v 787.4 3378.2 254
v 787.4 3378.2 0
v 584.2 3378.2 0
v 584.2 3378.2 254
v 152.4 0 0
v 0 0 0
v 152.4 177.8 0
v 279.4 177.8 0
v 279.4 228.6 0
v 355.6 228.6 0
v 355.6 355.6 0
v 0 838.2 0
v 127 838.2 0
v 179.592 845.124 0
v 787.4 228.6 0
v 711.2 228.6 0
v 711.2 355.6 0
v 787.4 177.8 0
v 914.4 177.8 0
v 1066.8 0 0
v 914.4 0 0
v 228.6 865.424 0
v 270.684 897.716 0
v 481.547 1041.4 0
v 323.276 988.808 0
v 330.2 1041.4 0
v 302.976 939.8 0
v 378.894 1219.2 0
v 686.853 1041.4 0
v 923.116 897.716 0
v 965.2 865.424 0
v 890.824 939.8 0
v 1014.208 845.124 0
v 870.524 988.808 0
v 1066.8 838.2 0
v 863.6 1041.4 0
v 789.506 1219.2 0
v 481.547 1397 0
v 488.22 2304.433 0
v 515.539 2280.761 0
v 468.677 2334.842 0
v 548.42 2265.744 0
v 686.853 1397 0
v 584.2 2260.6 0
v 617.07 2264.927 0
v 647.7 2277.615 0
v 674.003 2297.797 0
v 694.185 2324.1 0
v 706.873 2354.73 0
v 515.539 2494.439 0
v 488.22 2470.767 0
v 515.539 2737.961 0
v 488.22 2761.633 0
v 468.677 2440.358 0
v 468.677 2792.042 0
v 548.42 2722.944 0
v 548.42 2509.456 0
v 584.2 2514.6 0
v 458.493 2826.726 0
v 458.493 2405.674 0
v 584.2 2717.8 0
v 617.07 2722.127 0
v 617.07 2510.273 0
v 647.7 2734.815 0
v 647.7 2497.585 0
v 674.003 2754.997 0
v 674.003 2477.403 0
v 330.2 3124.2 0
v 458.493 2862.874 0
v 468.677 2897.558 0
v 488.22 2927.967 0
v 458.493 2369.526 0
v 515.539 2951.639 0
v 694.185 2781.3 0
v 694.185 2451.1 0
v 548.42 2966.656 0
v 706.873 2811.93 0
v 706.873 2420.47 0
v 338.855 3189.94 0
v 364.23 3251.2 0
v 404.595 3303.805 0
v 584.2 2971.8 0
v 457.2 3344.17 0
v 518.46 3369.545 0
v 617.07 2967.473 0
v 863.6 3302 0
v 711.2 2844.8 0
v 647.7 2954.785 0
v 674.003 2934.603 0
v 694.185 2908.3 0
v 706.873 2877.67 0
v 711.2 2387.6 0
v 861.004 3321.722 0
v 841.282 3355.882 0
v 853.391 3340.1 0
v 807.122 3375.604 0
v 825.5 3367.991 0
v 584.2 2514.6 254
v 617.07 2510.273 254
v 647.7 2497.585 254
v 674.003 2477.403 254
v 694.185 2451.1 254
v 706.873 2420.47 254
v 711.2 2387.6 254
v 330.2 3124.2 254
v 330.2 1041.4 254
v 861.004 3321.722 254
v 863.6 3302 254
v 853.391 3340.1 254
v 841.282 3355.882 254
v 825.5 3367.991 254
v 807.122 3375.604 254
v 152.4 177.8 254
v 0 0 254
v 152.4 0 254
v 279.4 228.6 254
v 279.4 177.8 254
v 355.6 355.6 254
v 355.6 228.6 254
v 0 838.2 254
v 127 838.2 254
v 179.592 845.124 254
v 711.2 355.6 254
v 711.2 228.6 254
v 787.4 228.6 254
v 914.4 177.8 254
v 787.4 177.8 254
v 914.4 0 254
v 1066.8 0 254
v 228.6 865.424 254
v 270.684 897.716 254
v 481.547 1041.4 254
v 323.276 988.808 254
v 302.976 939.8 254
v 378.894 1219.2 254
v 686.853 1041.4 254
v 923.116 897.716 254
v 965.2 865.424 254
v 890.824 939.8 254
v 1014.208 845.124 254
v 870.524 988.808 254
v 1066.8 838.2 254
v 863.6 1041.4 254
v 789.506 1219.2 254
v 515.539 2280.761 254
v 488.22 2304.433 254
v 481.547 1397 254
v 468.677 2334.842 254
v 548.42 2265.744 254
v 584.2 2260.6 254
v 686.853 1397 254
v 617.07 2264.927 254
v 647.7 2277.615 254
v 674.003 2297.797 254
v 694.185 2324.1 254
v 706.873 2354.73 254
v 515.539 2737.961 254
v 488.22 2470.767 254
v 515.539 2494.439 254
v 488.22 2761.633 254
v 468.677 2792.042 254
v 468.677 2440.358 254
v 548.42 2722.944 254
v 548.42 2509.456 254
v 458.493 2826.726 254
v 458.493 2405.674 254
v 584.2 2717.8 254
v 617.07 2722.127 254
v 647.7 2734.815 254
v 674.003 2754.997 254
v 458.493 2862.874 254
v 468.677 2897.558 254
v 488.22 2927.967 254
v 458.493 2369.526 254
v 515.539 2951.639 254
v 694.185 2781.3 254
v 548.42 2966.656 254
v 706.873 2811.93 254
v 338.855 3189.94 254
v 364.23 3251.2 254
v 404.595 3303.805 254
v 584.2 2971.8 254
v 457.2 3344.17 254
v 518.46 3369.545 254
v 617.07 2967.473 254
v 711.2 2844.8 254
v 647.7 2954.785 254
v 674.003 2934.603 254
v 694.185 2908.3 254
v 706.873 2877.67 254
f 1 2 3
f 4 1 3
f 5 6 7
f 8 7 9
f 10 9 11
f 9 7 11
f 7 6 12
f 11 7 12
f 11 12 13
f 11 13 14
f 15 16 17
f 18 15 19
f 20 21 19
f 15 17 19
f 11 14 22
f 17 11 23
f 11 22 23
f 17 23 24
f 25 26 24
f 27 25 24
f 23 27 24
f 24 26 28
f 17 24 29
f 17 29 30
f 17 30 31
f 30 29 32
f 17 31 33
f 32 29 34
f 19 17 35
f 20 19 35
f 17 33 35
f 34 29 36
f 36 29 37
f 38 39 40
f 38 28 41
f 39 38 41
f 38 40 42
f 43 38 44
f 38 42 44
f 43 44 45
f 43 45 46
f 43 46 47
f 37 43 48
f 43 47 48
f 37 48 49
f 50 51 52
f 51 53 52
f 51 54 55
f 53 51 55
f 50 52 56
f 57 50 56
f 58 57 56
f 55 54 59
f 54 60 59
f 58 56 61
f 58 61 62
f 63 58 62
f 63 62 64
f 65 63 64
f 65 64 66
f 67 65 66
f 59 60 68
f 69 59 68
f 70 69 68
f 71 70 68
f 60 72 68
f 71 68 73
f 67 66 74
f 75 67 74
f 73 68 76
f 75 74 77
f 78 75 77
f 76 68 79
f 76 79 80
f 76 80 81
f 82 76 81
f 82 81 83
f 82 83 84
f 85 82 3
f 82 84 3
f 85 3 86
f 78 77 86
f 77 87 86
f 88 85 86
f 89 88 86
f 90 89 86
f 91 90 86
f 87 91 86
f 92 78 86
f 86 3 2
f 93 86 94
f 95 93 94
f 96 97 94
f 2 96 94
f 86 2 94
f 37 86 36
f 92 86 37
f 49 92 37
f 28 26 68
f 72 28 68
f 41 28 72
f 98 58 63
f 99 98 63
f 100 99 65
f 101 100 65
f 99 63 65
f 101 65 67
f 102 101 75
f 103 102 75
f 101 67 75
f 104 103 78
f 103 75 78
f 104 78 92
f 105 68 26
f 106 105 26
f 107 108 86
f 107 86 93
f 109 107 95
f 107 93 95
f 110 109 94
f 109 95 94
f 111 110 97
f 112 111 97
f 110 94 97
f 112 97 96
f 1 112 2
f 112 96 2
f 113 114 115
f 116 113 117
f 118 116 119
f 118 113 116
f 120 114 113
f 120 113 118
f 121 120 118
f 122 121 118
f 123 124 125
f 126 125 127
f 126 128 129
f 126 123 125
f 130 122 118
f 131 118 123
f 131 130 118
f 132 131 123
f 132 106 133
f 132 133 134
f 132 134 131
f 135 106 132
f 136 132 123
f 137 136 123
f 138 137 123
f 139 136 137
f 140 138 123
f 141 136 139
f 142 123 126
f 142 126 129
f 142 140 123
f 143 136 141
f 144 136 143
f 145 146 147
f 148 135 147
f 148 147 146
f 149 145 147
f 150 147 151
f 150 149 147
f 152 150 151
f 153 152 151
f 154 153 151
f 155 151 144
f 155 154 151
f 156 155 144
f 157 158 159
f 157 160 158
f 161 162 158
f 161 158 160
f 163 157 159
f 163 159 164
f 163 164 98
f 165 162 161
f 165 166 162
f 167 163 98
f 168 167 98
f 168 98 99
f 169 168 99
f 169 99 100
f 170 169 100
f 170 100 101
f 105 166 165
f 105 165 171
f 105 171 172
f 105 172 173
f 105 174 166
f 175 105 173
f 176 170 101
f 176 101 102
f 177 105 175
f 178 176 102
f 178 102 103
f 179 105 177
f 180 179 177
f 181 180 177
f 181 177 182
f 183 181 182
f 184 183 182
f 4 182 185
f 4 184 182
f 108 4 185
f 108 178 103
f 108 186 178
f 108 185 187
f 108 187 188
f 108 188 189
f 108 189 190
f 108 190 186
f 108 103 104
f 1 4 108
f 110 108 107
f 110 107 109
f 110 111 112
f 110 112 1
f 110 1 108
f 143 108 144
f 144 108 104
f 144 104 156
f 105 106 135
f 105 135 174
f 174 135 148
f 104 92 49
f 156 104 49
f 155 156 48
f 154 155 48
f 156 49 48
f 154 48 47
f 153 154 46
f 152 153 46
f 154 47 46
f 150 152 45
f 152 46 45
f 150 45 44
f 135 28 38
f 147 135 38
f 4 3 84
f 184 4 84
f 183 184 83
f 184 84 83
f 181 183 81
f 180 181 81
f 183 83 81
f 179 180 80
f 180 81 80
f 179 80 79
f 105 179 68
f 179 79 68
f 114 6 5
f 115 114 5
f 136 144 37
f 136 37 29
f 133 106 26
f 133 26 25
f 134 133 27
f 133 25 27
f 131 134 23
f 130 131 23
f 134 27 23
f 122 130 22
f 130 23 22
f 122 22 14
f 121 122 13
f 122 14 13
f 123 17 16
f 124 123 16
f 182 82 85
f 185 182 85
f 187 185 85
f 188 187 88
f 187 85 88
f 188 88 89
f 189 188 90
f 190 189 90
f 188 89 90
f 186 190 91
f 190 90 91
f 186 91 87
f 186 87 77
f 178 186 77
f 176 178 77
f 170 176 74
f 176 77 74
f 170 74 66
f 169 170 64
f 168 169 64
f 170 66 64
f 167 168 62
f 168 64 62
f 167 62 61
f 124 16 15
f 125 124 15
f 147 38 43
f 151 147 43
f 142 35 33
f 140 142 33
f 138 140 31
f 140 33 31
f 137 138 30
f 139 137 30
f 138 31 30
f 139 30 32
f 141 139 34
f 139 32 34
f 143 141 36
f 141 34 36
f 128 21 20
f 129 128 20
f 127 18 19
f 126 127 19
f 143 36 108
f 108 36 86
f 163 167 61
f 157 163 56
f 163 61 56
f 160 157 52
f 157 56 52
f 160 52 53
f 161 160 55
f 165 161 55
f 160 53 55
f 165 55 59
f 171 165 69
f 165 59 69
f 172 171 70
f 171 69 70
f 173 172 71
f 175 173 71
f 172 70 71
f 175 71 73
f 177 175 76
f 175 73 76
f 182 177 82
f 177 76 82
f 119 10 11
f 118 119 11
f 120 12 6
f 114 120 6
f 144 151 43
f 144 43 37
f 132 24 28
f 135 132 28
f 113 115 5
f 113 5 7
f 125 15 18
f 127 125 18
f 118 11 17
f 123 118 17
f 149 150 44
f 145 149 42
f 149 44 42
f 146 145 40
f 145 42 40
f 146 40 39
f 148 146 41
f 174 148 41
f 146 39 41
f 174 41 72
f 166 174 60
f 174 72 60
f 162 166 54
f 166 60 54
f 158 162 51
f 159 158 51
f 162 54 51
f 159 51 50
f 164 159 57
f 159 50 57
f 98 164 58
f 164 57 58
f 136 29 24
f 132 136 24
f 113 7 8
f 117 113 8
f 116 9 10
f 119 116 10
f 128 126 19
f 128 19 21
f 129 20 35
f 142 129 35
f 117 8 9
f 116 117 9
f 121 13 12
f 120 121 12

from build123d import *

# Parameters (mm, degrees)
F1_DEPTH = 254


with BuildPart() as f1:
    # F0 (on Top) → F1 (new body)
    with BuildSketch(Plane.XY):
        with BuildLine():
            Line((0, 838.2), (0, 0))
            Line((0, 0), (152.4, 0))
            Line((152.4, 0), (152.4, 177.8))
            Line((152.4, 177.8), (279.4, 177.8))
            Line((279.4, 177.8), (279.4, 228.6))
            Line((279.4, 228.6), (355.6, 228.6))
            Line((355.6, 228.6), (355.6, 355.6))
            Line((355.6, 355.6), (533.4, 355.6))
            Line((533.4, 355.6), (711.2, 355.6))
            Line((711.2, 355.6), (711.2, 228.6))
            Line((711.2, 228.6), (787.4, 228.6))
            Line((787.4, 228.6), (787.4, 177.8))
            Line((787.4, 177.8), (914.4, 177.8))
            Line((914.4, 177.8), (914.4, 0))
            Line((914.4, 0), (1066.8, 0))
            Line((1066.8, 0), (1066.8, 838.2))
            ThreePointArc((1066.8, 838.2), (923.115902, 897.715902), (863.6, 1041.4))
            Line((863.6, 1041.4), (863.6, 3302))
            ThreePointArc((863.6, 3302), (841.281537, 3355.881537), (787.4, 3378.2))
            Line((787.4, 3378.2), (584.2, 3378.2))
            ThreePointArc((584.2, 3378.2), (404.594878, 3303.805122), (330.2, 3124.2))
            Line((330.2, 3124.2), (330.2, 1041.4))
            ThreePointArc((330.2, 1041.4), (270.684098, 897.715902), (127, 838.2))
            Line((127, 838.2), (0, 838.2))
        make_face()
        Polygon((481.547122, 1397), (584.2, 1397), (686.852878, 1397), (789.505756, 1219.2), (686.852878, 1041.4), (481.547122, 1041.4), (378.894244, 1219.2), align=None, mode=Mode.SUBTRACT)
        with BuildLine():
            ThreePointArc((584.2, 2260.6), (457.2, 2387.6), (584.2, 2514.6))
            ThreePointArc((584.2, 2514.6), (674.002561, 2477.402561), (711.2, 2387.6))
            ThreePointArc((711.2, 2387.6), (674.002561, 2297.797439), (584.2, 2260.6))
        make_face(mode=Mode.SUBTRACT)
        with BuildLine():
            ThreePointArc((584.2, 2717.8), (457.2, 2844.8), (584.2, 2971.8))
            ThreePointArc((584.2, 2971.8), (674.002561, 2934.602561), (711.2, 2844.8))
            ThreePointArc((711.2, 2844.8), (674.002561, 2754.997439), (584.2, 2717.8))
        make_face(mode=Mode.SUBTRACT)
    extrude(amount=F1_DEPTH)


solid = f1.part
